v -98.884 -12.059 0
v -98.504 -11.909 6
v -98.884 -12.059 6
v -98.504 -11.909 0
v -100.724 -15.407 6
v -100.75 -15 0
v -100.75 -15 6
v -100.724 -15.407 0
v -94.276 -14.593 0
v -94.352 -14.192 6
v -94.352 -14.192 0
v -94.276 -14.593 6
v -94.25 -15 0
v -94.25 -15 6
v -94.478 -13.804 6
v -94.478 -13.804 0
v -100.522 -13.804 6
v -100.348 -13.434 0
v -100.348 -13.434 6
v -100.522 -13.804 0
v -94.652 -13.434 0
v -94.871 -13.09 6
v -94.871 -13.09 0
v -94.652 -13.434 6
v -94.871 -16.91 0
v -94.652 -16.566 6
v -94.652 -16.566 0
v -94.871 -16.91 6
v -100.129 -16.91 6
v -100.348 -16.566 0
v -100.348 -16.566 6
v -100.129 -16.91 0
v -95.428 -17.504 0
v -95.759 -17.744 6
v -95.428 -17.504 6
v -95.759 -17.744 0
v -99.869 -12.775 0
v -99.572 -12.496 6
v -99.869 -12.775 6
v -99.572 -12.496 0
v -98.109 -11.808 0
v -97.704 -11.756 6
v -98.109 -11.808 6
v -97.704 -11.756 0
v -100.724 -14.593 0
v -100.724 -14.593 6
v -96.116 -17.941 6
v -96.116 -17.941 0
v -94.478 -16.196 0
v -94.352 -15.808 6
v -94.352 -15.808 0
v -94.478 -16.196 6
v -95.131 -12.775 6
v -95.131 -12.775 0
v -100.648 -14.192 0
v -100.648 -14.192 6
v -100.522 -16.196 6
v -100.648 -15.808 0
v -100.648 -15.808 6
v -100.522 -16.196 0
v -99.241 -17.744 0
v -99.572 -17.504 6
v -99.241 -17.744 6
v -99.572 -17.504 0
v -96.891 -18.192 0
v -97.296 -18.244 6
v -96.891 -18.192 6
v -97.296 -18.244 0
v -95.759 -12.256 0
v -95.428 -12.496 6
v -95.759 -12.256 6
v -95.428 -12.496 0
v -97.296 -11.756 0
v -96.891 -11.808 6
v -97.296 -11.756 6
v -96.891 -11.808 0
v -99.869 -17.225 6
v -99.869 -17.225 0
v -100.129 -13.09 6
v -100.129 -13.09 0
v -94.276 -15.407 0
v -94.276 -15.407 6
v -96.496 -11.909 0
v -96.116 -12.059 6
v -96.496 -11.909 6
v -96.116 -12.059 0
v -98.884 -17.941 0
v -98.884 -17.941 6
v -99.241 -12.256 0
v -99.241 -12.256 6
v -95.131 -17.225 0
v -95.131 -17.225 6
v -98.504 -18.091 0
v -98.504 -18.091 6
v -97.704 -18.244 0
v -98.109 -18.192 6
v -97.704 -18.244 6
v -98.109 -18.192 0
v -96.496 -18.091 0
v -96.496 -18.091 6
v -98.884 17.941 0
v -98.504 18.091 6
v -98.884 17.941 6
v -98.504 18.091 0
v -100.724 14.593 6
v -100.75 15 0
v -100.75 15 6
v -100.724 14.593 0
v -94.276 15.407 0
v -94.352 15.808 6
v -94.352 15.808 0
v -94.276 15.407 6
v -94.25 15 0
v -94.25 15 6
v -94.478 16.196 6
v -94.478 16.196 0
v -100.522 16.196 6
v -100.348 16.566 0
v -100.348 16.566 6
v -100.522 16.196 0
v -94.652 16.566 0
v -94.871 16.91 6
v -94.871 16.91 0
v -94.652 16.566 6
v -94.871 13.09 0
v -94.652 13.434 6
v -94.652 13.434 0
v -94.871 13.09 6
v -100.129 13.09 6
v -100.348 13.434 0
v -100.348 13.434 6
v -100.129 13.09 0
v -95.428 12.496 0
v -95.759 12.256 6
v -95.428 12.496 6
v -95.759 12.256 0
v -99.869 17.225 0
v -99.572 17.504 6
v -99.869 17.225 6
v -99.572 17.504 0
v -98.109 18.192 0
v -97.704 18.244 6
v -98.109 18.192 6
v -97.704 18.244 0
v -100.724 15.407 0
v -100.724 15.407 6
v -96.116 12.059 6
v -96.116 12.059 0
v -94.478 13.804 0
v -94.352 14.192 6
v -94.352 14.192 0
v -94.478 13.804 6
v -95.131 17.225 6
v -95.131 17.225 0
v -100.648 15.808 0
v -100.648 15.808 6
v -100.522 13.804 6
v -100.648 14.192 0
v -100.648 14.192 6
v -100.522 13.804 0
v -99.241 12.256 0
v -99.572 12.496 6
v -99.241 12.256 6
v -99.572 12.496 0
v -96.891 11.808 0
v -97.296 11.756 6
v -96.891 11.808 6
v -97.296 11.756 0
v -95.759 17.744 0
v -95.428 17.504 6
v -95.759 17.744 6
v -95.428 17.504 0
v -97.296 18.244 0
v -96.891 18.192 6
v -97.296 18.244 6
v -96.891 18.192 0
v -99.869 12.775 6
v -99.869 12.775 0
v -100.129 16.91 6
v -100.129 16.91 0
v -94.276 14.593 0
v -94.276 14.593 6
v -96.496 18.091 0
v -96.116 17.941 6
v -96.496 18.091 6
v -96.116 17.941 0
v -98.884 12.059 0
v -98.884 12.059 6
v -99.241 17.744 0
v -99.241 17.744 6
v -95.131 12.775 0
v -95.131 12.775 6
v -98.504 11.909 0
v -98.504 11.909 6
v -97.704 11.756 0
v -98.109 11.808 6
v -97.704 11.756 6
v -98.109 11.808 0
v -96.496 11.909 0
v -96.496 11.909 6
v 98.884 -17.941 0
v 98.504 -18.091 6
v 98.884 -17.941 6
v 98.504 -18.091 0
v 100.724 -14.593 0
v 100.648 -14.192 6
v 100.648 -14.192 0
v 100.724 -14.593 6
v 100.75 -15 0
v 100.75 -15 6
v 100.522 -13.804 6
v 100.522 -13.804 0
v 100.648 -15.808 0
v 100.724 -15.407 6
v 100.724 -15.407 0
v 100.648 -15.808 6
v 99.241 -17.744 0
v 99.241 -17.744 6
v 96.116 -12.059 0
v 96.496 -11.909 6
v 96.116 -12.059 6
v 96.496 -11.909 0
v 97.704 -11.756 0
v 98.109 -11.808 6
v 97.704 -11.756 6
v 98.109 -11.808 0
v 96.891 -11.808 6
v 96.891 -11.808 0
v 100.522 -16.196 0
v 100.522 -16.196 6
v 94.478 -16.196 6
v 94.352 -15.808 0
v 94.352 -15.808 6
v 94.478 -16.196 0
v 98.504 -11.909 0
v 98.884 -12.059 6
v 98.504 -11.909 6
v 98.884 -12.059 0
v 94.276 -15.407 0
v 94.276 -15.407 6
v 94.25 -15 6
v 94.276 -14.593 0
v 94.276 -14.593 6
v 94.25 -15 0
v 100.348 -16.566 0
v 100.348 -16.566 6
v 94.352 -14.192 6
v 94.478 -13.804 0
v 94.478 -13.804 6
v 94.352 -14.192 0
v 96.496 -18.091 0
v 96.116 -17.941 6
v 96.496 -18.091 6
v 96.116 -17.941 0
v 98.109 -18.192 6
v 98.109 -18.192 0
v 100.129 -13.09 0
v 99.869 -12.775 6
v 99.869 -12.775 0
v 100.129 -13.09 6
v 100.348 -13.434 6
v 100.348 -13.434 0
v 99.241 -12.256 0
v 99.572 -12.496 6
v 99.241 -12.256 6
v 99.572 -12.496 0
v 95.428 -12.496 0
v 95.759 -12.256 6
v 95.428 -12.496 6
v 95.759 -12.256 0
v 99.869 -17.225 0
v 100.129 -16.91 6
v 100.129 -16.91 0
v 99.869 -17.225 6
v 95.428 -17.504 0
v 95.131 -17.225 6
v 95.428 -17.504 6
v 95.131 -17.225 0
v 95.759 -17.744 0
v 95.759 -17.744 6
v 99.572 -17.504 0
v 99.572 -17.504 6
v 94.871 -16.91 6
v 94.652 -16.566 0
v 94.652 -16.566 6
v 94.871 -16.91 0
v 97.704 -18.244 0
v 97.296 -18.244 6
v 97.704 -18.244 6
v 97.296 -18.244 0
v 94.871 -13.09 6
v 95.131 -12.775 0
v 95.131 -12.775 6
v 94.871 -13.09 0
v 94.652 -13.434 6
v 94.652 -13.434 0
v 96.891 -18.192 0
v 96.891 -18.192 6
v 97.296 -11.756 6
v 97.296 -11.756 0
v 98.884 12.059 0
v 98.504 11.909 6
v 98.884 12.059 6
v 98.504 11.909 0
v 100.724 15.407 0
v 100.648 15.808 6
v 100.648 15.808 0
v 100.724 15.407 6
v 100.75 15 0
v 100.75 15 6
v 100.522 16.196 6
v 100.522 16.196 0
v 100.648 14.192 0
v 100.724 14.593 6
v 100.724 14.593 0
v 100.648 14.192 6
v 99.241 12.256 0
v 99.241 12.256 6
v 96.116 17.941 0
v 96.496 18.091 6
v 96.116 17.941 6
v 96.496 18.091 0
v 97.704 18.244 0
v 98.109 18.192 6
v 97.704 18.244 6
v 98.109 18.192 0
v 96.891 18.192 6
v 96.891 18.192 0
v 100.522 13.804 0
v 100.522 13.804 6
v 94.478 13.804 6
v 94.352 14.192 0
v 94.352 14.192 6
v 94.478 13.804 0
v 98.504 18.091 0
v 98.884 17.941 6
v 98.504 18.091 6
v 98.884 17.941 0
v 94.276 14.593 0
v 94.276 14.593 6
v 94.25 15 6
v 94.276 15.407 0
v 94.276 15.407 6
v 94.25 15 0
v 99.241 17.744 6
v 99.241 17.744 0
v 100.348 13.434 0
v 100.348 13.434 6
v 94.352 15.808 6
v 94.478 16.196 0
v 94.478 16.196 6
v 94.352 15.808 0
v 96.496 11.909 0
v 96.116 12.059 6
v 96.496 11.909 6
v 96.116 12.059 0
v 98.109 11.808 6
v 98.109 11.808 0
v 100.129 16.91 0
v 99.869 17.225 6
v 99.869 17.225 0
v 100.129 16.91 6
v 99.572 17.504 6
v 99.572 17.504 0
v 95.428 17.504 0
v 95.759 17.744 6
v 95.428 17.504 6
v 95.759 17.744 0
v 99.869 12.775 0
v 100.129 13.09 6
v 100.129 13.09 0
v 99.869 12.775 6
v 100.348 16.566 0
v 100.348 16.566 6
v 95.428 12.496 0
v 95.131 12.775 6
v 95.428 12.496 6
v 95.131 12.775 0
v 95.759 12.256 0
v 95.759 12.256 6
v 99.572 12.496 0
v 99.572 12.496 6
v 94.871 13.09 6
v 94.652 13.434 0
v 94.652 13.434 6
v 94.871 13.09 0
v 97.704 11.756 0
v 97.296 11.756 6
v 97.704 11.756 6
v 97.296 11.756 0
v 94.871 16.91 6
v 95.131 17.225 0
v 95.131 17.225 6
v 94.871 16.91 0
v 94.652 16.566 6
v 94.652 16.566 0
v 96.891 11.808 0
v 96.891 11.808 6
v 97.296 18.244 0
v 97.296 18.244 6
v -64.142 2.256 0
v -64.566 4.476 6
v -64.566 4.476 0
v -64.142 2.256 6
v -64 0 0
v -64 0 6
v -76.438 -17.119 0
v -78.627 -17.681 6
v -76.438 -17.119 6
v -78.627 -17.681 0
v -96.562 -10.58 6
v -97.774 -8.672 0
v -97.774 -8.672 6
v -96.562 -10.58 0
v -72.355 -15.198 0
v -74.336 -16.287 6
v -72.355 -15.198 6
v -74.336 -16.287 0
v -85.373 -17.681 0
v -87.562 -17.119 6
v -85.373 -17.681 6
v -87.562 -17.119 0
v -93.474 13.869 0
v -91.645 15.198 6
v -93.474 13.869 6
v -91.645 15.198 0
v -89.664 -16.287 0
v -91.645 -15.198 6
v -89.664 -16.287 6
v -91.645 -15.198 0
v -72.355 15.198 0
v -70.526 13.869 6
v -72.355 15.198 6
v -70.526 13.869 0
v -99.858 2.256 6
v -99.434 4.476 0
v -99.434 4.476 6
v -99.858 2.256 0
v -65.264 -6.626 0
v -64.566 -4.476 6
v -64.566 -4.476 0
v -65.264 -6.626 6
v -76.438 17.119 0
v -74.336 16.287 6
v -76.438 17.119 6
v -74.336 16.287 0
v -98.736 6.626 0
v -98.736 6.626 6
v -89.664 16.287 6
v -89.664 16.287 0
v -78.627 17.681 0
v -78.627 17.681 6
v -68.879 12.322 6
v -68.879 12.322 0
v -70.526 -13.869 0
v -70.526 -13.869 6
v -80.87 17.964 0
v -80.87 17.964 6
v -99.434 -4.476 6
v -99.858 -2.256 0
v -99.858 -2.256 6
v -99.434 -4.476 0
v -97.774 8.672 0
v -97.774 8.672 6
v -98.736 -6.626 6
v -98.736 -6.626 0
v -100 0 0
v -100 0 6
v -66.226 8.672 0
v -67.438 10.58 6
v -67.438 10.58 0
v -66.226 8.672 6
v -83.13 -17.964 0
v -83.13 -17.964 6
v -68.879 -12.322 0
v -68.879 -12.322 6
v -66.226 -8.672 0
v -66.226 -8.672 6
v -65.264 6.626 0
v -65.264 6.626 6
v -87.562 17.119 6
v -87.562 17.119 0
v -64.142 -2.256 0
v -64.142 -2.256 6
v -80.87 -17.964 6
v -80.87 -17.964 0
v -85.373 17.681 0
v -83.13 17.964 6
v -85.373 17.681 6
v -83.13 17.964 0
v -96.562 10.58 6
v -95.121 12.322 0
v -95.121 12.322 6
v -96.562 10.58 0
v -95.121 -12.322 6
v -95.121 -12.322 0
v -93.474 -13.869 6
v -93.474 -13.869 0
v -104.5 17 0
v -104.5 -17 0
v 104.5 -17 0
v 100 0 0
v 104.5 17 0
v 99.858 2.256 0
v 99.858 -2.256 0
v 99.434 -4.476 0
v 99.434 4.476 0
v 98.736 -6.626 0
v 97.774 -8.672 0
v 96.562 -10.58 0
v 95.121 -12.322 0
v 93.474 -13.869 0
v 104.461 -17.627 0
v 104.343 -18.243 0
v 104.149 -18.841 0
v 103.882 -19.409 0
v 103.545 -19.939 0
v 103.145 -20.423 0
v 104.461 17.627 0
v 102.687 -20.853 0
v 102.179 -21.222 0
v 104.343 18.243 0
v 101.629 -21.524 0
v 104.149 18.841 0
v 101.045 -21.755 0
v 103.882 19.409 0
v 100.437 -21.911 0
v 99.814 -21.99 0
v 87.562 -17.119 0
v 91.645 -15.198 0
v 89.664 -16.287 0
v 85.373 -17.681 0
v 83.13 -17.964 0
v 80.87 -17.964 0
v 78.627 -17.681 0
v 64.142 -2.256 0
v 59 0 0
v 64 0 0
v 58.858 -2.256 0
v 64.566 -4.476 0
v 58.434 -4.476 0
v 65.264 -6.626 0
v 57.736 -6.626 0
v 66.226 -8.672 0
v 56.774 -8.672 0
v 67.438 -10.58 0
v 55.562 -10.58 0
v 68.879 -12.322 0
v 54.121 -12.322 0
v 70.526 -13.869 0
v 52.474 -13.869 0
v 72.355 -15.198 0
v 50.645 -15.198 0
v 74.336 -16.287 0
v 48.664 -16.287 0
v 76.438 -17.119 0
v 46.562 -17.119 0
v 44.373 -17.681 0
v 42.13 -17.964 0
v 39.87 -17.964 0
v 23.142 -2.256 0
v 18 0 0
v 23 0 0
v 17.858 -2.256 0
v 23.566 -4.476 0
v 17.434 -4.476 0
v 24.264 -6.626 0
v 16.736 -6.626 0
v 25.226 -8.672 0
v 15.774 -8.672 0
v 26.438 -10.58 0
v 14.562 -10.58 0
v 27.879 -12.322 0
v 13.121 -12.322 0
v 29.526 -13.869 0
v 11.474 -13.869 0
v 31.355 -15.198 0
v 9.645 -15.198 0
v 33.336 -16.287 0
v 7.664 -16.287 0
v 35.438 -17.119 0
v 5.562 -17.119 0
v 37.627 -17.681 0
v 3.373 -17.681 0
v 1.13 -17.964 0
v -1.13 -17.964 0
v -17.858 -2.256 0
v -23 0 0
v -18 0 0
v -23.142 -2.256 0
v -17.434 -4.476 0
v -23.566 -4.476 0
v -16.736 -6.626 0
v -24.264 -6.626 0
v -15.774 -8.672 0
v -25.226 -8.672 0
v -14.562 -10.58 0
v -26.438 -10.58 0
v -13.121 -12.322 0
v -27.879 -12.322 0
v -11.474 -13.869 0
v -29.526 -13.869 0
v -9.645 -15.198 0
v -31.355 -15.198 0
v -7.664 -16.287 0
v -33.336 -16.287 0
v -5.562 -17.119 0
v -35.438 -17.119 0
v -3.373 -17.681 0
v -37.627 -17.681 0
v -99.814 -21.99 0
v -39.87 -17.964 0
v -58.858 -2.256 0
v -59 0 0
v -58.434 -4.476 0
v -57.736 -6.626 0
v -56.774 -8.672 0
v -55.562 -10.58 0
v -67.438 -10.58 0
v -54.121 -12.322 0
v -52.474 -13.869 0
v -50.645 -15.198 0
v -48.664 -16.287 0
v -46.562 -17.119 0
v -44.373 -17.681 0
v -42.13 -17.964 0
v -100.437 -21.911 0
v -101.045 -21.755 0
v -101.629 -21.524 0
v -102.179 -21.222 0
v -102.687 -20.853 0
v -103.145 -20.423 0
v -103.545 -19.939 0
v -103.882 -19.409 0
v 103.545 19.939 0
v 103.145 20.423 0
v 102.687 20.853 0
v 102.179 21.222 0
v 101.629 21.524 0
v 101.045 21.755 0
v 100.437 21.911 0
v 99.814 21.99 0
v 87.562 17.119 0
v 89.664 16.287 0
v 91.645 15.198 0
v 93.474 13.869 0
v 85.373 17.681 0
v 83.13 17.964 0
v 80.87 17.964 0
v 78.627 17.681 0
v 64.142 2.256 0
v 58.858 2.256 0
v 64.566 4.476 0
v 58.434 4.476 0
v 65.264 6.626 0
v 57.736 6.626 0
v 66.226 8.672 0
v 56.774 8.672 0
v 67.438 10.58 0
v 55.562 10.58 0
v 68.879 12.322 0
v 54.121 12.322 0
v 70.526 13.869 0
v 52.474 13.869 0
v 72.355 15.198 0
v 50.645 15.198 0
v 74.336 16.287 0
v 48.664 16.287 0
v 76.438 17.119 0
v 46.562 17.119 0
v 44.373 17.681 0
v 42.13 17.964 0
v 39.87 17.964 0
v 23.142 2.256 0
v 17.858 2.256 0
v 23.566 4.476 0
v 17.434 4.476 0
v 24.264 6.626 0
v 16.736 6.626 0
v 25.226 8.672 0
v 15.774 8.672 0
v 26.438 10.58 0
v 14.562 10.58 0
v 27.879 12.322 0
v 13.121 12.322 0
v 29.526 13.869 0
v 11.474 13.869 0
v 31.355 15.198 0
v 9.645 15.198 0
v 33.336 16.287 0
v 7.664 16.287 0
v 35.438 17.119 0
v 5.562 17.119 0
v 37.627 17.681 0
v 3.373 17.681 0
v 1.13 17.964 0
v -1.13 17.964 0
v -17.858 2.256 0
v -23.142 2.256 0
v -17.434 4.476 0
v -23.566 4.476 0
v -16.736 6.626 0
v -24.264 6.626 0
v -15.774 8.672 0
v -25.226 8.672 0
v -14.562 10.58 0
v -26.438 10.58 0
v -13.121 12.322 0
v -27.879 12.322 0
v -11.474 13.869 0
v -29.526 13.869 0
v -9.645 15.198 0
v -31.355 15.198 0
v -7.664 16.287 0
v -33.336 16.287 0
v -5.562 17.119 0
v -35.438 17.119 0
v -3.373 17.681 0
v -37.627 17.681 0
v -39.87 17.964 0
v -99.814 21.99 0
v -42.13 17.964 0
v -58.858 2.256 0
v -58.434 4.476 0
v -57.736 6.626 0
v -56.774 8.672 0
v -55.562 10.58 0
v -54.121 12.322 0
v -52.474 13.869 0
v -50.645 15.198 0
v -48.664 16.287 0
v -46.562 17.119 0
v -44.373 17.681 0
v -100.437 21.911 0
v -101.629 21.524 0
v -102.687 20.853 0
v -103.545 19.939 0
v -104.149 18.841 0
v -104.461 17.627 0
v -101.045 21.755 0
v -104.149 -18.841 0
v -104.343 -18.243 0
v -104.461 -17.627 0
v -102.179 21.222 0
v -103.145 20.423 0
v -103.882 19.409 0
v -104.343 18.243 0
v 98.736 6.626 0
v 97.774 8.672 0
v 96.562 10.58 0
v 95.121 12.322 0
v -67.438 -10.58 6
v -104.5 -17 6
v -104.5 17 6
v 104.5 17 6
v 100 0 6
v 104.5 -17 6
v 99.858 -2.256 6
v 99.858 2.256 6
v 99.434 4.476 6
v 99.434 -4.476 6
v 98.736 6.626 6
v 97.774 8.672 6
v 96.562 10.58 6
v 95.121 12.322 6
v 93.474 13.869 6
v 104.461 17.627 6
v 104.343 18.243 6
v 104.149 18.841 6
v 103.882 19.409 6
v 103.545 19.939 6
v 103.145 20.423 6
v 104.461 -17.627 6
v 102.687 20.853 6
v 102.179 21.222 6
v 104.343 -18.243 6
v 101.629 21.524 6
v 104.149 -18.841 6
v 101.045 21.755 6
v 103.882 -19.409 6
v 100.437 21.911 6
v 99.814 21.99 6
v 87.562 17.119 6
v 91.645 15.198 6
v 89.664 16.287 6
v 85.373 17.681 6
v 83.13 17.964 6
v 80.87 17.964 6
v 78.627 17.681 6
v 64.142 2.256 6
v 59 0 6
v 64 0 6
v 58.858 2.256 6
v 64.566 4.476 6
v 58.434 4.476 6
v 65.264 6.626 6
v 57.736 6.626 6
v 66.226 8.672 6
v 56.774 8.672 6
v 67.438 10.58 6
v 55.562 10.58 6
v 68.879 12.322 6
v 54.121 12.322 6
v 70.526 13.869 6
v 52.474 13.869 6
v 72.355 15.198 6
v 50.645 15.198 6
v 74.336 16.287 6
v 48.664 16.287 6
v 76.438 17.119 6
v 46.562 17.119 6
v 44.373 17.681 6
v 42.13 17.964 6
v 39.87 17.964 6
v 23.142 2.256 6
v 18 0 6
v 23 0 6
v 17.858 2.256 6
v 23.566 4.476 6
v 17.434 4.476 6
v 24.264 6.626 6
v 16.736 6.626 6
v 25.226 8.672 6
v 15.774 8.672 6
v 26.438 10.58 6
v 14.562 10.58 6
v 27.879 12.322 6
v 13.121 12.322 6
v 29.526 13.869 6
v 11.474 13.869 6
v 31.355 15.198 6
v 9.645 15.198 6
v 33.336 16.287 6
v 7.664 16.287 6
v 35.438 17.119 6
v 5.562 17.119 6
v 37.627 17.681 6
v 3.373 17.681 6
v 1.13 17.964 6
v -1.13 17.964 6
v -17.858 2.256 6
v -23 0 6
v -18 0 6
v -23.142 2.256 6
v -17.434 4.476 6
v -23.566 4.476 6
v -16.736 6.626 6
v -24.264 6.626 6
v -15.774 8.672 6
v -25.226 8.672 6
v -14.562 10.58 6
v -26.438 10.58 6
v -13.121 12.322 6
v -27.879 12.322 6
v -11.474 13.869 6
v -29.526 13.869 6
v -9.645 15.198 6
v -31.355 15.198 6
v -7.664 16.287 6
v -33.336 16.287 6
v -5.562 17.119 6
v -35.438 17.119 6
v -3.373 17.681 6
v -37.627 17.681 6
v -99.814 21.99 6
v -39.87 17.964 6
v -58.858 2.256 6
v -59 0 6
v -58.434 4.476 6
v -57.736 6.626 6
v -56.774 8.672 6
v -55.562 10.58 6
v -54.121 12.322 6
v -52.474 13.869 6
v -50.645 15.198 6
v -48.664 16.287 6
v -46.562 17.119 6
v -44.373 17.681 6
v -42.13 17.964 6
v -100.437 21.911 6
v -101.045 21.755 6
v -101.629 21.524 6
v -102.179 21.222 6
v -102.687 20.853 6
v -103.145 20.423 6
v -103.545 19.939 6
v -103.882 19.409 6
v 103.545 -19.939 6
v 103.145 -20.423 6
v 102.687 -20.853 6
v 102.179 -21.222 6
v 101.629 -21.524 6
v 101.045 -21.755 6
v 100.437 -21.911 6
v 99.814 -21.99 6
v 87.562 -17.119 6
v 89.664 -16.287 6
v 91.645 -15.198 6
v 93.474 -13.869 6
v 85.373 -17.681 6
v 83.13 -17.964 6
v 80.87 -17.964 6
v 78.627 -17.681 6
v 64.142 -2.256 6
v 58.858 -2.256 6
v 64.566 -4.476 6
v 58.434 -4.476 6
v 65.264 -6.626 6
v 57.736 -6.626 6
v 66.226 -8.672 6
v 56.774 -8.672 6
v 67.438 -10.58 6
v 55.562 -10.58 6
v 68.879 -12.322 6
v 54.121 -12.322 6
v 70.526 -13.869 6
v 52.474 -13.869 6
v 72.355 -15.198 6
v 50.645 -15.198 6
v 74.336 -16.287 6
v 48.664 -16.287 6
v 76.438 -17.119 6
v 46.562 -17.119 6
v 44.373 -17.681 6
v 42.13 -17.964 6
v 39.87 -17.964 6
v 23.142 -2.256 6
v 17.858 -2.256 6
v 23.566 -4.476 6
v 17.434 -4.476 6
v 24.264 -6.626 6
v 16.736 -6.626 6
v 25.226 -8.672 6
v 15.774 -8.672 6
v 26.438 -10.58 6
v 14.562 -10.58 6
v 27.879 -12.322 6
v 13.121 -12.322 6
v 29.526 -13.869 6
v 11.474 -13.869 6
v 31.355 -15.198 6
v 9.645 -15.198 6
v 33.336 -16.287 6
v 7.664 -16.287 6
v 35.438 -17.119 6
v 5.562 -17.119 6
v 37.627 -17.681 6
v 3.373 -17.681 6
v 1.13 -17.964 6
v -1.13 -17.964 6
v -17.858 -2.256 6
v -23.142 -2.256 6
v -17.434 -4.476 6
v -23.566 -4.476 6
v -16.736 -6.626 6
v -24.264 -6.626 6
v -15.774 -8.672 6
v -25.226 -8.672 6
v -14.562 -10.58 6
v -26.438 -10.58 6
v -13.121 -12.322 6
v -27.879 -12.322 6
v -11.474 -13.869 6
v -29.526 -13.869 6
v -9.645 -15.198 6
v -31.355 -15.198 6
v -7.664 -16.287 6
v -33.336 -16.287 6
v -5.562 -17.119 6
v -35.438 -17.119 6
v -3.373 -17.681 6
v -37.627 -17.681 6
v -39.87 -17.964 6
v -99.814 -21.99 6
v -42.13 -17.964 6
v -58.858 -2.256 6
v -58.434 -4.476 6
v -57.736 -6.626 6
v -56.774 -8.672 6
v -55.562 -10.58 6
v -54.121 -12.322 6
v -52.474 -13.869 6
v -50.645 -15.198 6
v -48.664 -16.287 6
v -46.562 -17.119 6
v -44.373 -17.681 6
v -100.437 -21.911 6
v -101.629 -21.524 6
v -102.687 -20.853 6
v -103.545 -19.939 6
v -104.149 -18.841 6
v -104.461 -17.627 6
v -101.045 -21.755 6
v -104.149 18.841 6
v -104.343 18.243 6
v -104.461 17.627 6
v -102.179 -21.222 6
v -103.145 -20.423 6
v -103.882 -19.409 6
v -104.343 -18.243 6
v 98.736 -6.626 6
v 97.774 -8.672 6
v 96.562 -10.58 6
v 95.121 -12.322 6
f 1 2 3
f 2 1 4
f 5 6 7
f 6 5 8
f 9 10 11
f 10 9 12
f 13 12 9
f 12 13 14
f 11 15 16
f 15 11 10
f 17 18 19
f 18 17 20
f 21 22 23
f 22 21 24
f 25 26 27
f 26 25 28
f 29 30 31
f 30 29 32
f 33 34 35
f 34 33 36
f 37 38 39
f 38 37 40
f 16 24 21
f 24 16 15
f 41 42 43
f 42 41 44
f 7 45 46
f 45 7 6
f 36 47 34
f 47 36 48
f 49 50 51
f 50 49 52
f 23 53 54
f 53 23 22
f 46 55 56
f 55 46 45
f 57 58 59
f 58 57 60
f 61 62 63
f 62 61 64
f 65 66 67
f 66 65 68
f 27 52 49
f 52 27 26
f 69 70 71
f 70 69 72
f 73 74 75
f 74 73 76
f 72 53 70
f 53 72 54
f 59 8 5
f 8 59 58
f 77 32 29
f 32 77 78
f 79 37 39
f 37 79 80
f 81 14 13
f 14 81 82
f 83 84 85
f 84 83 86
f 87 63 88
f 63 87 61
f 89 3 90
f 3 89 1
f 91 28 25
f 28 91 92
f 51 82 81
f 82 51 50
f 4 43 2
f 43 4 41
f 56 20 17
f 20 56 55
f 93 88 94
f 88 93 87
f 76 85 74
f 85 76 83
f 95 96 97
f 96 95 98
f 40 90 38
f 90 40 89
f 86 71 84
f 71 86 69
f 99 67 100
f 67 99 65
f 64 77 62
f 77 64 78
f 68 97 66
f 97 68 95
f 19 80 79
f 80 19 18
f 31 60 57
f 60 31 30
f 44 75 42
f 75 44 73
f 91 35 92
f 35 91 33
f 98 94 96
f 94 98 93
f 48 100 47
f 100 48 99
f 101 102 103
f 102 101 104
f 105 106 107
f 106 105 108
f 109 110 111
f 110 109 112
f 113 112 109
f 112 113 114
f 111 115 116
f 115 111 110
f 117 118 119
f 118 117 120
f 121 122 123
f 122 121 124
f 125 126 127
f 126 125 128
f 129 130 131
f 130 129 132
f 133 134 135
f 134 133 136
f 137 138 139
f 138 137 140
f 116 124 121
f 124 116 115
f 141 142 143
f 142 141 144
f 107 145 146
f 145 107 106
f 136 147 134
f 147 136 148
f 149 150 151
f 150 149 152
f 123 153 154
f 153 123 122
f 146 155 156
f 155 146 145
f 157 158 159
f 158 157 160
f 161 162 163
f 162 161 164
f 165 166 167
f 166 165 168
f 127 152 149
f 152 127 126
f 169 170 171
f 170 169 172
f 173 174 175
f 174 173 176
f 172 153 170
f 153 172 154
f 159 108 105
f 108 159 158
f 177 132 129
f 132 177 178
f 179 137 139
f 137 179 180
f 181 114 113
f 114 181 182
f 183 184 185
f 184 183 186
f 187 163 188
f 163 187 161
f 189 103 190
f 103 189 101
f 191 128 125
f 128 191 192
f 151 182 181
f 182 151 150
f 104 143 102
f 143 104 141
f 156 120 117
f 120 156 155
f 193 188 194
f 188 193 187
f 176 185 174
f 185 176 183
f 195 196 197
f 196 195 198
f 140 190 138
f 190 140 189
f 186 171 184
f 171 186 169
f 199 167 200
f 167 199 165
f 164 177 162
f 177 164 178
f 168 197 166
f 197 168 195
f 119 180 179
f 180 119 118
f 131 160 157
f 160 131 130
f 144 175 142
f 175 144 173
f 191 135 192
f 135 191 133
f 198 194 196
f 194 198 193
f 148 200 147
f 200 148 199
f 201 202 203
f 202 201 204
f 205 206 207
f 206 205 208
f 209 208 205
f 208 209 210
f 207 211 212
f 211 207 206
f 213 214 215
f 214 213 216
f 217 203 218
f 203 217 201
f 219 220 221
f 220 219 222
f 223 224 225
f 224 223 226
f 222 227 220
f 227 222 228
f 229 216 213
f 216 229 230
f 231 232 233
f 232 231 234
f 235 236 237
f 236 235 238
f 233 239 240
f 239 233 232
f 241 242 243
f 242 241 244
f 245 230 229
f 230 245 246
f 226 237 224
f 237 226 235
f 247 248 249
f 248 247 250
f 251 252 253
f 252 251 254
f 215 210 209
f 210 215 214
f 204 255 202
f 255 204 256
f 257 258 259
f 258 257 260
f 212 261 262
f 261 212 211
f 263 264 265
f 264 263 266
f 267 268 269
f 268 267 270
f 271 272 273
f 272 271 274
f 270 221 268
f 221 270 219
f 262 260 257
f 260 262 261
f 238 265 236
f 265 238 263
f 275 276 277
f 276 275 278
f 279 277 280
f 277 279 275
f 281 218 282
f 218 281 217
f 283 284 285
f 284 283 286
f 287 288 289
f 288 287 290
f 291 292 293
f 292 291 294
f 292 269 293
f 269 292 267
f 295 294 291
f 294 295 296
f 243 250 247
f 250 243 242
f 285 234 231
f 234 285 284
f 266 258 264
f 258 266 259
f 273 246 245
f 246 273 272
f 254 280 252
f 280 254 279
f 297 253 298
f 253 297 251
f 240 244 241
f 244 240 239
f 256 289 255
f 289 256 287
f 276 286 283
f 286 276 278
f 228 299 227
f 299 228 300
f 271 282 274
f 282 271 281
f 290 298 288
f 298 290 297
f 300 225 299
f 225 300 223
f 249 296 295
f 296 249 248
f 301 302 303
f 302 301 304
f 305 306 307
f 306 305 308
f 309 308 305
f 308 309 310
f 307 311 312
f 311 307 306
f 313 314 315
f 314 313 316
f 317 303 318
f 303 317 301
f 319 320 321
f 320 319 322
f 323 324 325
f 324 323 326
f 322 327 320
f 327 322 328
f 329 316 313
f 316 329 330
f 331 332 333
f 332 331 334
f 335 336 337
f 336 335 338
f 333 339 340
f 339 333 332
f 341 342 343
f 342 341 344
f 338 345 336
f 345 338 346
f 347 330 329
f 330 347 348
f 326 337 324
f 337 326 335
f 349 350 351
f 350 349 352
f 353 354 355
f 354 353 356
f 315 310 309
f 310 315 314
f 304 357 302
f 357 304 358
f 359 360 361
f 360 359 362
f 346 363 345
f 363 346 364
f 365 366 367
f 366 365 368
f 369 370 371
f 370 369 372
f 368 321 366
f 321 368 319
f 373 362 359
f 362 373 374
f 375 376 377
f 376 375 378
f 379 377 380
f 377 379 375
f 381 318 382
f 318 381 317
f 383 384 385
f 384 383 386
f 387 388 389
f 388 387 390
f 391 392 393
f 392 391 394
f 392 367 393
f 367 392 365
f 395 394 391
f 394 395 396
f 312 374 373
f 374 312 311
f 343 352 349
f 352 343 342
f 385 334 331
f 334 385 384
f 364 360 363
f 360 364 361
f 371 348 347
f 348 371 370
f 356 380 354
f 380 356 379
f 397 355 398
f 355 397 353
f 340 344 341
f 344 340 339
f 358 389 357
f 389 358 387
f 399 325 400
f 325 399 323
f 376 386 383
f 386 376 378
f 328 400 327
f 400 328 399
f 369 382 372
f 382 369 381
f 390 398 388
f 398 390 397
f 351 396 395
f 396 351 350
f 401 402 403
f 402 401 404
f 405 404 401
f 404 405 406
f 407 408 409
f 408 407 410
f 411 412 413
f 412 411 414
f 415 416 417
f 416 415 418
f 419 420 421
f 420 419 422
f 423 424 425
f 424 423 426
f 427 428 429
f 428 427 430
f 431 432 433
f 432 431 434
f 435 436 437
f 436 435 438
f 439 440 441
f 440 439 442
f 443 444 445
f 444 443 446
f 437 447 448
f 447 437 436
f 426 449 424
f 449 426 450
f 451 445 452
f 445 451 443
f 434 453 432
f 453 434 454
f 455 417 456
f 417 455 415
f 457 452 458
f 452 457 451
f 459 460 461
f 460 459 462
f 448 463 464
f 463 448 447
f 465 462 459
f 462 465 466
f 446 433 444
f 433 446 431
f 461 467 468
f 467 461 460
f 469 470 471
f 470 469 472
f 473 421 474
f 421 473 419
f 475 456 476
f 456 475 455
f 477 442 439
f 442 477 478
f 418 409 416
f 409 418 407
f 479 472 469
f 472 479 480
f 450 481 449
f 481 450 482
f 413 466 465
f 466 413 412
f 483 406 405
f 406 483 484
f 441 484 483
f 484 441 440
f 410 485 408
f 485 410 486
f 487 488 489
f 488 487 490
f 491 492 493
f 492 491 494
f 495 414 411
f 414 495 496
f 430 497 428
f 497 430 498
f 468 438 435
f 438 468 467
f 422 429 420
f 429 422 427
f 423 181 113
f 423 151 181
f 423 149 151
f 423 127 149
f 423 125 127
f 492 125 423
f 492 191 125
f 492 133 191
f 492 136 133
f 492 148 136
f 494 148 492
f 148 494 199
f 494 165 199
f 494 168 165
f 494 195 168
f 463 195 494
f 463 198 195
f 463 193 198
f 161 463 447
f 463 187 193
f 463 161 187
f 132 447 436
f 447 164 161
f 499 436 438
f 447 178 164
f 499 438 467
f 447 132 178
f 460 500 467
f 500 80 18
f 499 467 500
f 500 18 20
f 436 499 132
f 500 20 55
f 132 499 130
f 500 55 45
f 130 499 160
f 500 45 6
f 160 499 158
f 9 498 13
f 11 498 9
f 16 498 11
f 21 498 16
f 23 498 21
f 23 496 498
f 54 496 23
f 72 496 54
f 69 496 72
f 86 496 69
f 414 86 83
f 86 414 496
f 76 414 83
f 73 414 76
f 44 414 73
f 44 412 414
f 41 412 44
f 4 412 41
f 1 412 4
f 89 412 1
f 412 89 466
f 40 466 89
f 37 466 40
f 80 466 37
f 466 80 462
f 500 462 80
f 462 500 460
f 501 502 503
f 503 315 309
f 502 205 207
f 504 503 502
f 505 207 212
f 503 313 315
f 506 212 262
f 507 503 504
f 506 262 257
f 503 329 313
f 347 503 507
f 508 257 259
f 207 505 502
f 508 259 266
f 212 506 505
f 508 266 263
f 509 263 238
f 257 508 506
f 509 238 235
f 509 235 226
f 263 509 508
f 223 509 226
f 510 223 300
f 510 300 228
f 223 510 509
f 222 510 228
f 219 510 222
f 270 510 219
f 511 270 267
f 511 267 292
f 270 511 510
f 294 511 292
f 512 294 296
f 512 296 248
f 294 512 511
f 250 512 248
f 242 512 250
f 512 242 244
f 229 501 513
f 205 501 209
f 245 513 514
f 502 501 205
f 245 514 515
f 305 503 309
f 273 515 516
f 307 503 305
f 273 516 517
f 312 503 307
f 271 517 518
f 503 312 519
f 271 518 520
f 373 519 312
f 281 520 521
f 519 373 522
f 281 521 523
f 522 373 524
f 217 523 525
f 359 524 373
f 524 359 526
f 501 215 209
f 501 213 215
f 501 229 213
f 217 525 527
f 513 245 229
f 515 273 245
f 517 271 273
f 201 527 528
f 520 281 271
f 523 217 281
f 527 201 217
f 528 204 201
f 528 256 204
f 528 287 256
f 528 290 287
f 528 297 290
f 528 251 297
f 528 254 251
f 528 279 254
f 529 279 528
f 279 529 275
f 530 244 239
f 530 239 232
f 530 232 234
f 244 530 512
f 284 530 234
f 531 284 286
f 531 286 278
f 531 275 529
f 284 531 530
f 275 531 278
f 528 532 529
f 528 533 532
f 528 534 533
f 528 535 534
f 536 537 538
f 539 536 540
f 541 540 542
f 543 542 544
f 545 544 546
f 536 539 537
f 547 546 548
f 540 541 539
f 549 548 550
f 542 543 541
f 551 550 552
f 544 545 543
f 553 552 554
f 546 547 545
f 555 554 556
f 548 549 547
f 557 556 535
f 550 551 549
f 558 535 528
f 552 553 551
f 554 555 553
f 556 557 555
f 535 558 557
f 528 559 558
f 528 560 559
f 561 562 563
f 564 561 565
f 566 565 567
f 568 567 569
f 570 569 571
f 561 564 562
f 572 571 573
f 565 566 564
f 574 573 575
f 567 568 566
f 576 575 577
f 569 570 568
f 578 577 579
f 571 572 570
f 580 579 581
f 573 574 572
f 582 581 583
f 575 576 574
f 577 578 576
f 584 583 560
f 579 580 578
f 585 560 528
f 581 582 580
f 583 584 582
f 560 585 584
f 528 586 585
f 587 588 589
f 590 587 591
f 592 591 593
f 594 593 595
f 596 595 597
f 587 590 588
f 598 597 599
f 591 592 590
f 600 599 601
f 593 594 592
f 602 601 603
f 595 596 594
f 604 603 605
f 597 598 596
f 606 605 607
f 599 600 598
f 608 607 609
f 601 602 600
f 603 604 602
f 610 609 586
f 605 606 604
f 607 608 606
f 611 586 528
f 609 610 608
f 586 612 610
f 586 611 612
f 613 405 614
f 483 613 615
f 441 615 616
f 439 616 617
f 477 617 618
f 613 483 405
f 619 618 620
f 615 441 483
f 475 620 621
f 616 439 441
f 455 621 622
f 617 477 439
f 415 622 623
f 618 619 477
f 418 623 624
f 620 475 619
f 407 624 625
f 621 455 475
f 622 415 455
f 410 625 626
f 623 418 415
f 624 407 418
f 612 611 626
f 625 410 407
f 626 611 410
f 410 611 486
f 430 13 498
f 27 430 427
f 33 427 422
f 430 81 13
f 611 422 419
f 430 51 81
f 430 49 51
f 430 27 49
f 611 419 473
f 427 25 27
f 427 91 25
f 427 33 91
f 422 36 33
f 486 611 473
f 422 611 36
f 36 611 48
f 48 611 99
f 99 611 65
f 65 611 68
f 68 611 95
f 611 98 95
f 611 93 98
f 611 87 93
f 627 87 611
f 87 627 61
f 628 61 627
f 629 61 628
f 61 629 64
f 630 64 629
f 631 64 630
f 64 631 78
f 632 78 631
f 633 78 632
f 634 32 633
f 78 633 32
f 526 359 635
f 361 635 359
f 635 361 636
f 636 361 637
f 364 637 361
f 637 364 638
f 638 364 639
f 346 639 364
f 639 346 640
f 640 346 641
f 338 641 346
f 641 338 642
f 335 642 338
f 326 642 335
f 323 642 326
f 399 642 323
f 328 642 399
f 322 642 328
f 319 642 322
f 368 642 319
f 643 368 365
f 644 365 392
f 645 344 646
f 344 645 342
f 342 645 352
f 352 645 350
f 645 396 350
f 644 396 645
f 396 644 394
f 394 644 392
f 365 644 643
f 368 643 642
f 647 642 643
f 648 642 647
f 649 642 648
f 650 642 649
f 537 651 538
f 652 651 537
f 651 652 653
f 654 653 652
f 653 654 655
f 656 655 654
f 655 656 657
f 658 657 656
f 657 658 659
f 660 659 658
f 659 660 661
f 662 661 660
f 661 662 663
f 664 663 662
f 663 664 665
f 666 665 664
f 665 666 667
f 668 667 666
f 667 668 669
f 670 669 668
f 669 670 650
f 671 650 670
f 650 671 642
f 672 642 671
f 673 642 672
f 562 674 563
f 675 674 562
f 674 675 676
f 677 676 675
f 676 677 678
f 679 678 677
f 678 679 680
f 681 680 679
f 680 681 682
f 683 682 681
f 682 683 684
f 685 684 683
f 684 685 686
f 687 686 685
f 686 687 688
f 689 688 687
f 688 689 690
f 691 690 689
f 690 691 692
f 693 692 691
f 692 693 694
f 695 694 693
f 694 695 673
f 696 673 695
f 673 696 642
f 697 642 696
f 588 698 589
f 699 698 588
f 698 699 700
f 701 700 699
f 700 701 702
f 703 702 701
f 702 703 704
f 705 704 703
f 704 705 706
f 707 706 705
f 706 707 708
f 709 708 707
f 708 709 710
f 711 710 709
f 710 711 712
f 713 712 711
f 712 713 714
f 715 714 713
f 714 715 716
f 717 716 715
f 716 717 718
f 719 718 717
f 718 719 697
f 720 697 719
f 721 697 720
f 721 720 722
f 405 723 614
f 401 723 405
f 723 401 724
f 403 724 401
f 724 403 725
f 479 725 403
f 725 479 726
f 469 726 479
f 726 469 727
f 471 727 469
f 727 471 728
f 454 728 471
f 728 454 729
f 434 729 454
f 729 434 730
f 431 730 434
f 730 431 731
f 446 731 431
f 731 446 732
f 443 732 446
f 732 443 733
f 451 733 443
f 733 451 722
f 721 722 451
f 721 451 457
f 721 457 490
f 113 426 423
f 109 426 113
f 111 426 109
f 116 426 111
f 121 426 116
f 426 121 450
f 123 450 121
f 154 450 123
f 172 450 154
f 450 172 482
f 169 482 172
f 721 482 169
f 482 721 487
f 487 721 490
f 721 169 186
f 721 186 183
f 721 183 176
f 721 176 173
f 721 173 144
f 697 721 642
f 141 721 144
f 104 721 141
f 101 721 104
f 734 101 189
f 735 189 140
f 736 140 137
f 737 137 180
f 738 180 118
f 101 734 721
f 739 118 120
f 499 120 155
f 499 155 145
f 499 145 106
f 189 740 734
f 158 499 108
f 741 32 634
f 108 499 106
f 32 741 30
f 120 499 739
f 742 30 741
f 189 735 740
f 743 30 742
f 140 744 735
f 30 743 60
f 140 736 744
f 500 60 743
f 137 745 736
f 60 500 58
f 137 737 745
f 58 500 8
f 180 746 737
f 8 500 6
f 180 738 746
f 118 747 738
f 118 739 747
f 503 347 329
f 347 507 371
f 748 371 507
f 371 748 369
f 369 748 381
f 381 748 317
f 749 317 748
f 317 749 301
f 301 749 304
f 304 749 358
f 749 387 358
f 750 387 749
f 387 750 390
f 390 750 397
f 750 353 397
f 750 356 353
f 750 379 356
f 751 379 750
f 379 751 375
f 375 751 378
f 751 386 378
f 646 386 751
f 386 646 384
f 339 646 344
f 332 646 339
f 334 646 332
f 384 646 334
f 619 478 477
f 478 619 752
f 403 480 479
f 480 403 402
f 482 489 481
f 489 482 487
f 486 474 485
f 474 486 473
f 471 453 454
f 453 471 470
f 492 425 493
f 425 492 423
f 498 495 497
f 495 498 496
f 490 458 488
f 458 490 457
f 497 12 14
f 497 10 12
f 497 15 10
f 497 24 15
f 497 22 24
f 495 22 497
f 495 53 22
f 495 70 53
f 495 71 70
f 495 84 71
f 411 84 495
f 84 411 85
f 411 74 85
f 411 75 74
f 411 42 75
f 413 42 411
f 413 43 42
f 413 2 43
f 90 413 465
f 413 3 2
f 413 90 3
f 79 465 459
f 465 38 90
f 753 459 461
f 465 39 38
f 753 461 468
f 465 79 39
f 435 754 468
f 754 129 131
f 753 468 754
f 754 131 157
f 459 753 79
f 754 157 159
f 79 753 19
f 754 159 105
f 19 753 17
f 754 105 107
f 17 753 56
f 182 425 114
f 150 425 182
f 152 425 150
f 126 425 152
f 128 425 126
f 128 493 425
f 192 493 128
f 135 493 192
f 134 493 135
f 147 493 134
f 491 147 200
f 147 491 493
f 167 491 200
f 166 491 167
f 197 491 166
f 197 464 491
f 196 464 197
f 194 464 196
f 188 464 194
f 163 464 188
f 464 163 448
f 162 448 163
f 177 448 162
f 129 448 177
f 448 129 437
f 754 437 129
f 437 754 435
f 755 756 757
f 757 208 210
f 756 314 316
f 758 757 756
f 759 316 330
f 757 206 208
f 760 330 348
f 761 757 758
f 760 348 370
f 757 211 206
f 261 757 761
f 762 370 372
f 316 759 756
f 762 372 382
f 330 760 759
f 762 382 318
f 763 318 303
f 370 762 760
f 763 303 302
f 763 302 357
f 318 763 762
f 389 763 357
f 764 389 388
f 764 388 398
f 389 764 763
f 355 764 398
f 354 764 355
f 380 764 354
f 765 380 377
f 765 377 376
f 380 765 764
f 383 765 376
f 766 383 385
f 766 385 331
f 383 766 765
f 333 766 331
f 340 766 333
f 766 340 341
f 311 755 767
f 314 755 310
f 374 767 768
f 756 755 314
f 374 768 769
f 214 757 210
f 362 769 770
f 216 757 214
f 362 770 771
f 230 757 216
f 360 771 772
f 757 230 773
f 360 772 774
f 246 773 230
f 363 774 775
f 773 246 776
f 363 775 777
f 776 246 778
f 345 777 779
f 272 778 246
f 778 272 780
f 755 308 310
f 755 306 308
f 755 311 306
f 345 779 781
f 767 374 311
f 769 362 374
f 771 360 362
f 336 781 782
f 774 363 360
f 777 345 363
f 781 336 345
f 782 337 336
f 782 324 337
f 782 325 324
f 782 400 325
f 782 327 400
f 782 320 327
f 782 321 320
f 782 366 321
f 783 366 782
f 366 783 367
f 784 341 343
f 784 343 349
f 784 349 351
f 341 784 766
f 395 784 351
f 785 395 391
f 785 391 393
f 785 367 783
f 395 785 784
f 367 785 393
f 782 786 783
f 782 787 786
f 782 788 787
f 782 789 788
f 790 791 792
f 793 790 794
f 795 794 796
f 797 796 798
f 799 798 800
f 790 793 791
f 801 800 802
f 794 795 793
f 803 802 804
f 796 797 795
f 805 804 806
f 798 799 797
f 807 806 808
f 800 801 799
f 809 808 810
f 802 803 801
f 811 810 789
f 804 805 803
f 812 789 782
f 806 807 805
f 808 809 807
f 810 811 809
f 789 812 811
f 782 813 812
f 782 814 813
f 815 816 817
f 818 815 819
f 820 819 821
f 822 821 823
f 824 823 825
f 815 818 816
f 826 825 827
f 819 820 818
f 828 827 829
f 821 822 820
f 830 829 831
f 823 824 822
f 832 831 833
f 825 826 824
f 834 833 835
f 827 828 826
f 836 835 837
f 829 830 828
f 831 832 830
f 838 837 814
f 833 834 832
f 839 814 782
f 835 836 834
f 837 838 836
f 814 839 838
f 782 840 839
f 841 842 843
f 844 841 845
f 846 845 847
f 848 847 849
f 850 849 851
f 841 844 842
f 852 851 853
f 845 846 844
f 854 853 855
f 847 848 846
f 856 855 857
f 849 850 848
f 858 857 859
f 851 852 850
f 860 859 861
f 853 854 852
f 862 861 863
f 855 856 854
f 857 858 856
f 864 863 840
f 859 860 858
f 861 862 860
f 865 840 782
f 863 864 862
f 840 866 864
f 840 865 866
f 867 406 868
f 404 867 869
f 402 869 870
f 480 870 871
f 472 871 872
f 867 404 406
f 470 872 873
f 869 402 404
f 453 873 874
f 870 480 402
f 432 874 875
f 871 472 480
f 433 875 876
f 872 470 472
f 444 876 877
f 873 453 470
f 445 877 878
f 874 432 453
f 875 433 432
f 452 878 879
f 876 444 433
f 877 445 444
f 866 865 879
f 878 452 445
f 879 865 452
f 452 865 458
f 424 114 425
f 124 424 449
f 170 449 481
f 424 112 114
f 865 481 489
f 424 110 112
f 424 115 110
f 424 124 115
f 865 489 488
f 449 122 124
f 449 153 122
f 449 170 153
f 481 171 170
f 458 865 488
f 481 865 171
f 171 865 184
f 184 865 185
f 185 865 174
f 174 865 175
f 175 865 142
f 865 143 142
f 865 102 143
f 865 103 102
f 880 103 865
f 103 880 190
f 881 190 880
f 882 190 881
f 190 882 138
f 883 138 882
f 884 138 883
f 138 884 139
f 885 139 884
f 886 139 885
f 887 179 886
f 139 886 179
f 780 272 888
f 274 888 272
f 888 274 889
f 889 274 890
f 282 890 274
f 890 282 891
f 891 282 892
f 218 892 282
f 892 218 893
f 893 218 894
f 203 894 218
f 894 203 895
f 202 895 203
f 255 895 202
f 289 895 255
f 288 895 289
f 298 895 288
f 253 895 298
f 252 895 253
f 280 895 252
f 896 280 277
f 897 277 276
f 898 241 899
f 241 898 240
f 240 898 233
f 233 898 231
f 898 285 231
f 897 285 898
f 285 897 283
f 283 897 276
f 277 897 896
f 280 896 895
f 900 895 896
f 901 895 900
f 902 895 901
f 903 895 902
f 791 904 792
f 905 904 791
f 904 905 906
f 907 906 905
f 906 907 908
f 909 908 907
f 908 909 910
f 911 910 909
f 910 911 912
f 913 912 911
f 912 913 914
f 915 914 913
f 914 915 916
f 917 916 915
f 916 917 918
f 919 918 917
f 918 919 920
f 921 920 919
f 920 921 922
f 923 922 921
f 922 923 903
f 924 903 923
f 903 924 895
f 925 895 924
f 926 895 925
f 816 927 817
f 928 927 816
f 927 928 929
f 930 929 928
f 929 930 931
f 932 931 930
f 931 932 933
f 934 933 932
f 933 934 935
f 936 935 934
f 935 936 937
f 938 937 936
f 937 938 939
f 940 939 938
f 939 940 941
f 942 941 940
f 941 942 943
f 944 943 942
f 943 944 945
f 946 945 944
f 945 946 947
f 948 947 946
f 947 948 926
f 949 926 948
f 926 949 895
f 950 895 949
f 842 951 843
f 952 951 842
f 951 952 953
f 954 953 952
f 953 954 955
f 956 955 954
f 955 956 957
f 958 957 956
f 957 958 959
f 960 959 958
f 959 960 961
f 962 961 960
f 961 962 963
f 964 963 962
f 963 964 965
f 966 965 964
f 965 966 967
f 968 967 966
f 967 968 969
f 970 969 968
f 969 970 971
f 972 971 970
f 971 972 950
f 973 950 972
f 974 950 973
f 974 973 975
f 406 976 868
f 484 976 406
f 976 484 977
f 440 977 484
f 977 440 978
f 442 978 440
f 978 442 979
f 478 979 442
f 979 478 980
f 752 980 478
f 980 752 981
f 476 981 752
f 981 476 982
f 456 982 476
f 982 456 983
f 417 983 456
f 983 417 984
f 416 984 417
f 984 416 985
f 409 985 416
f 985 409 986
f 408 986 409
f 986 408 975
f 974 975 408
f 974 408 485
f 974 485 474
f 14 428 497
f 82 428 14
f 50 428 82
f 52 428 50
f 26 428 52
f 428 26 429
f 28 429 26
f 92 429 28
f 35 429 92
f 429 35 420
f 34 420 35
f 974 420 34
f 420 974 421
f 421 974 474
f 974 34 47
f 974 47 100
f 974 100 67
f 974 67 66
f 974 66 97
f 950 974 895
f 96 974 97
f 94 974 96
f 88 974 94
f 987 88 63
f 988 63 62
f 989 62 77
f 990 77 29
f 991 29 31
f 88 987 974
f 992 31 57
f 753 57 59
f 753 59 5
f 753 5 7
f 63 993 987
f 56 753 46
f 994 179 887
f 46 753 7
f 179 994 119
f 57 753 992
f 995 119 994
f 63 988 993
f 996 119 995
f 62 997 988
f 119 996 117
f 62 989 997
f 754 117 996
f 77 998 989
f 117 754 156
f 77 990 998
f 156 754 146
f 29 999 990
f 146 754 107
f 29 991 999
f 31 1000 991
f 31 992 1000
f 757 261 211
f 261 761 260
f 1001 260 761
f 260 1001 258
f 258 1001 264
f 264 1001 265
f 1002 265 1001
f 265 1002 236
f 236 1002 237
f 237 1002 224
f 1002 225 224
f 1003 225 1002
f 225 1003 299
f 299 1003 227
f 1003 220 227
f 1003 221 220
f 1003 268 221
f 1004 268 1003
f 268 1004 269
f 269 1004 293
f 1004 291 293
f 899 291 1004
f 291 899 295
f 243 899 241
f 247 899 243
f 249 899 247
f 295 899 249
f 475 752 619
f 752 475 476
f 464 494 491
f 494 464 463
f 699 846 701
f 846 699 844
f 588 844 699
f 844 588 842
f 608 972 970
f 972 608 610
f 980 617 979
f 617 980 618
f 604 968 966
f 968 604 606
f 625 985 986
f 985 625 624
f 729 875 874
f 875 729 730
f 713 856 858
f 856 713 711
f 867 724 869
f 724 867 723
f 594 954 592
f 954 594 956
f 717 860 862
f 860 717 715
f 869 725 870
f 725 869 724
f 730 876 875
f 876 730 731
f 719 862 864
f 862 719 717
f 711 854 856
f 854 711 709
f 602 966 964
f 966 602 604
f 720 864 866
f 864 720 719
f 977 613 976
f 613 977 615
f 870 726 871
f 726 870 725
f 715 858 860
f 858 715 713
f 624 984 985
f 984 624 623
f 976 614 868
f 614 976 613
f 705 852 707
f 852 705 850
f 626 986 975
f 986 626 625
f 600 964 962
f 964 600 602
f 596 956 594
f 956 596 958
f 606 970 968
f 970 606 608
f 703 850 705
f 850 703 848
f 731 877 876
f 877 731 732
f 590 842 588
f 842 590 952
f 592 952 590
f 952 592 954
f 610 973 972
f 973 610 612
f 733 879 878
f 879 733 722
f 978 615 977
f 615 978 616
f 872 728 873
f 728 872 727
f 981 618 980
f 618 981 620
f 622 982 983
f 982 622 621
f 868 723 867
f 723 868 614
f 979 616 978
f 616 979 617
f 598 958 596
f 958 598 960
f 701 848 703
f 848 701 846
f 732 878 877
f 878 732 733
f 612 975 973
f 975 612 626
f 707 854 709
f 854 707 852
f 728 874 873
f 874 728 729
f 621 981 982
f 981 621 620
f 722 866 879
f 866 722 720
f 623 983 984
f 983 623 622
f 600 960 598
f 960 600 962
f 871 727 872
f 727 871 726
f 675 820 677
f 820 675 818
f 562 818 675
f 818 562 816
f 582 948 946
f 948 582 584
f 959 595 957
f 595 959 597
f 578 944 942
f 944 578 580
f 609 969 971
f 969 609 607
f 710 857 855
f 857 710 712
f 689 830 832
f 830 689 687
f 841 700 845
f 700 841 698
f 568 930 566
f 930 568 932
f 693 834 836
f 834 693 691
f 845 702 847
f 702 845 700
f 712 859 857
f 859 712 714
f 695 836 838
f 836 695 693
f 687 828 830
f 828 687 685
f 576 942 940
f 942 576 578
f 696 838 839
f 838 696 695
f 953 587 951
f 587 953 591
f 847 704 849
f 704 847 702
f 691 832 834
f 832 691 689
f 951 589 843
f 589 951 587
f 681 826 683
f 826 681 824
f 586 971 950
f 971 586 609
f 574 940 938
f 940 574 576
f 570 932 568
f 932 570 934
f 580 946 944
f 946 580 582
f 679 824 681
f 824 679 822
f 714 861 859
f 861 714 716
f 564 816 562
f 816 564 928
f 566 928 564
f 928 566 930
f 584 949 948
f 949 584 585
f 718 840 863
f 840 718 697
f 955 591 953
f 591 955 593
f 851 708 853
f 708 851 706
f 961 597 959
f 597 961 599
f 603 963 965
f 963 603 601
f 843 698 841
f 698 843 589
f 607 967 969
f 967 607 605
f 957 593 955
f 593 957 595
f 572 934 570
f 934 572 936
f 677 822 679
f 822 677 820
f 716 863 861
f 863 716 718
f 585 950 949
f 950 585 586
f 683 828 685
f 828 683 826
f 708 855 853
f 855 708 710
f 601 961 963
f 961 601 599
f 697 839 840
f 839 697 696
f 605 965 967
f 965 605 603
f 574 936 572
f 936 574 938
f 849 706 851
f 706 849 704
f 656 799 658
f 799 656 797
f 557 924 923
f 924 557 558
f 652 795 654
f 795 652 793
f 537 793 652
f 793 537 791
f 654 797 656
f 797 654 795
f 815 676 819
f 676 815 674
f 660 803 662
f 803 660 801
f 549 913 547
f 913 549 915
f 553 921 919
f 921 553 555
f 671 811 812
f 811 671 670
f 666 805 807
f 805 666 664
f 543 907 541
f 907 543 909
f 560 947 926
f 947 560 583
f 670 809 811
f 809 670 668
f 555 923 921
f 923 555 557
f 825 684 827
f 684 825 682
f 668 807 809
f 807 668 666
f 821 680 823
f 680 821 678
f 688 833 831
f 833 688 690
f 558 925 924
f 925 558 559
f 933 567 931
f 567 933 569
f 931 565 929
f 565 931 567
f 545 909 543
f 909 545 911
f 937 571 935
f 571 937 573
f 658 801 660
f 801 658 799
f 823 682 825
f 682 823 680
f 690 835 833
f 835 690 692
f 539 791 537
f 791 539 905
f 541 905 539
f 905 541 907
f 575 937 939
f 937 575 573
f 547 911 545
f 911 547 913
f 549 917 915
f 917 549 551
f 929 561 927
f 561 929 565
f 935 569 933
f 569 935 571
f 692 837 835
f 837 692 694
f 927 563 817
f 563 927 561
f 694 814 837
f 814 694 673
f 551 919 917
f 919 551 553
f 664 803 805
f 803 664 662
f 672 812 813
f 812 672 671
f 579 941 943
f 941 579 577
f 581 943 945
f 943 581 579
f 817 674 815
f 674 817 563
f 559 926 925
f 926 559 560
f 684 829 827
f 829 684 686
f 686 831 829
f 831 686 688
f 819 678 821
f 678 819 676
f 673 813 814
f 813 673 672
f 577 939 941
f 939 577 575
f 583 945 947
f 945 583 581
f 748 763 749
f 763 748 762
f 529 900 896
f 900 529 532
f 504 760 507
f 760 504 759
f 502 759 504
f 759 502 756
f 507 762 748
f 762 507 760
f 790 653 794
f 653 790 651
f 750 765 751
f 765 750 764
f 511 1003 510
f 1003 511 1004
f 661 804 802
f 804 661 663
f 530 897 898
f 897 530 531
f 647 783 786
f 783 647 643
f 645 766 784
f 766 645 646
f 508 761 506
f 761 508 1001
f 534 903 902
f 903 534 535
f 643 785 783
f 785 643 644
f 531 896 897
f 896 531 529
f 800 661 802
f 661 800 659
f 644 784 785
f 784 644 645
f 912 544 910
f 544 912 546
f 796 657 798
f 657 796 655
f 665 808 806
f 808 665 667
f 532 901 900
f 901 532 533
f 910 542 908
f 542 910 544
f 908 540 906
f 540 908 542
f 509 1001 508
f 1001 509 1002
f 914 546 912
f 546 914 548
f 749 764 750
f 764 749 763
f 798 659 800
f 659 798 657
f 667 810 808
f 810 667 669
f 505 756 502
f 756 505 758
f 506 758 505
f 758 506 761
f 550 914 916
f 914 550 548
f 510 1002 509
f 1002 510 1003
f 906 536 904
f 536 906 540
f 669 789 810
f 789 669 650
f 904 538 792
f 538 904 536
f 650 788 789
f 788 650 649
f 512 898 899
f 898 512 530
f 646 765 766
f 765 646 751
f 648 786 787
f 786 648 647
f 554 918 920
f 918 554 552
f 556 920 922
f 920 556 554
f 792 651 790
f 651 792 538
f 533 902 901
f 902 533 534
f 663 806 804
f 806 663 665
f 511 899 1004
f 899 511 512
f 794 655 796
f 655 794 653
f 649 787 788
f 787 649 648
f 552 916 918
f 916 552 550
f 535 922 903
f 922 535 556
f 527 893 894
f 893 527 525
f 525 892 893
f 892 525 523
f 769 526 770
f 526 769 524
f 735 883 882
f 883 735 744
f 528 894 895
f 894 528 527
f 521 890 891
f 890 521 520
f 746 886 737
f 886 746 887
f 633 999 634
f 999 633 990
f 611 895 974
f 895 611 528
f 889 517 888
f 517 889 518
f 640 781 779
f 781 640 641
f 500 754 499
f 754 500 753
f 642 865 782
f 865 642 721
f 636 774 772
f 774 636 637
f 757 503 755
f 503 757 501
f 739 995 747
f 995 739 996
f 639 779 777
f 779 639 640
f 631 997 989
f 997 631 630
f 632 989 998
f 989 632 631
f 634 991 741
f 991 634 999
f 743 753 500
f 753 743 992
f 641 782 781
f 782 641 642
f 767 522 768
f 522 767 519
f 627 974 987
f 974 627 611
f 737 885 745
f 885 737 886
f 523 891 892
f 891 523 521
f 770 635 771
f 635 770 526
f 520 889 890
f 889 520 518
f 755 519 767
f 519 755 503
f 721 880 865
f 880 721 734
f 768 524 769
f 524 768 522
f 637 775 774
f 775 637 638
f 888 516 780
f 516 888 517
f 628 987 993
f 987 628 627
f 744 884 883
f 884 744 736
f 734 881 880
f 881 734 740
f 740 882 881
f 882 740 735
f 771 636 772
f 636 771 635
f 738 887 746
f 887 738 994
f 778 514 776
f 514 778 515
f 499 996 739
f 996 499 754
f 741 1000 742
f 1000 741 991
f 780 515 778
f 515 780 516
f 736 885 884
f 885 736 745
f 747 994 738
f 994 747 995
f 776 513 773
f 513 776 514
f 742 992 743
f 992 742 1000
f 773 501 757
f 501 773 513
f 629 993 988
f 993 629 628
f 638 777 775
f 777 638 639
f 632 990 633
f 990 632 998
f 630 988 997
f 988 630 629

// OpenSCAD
$fn = 50;

difference() {
	union() {
		hull() {
			translate(v = [-99.5, 17.0, 0]) {
				cylinder(h = 6, r = 5);
			}
			translate(v = [99.5, 17.0, 0]) {
				cylinder(h = 6, r = 5);
			}
			translate(v = [-99.5, -17.0, 0]) {
				cylinder(h = 6, r = 5);
			}
			translate(v = [99.5, -17.0, 0]) {
				cylinder(h = 6, r = 5);
			}
		}
	}
	union() {
		translate(v = [-97.5, -15.0, -100.0]) {
			cylinder(h = 200, r = 3.25);
		}
		translate(v = [-97.5, 15.0, -100.0]) {
			cylinder(h = 200, r = 3.25);
		}
		translate(v = [97.5, -15.0, -100.0]) {
			cylinder(h = 200, r = 3.25);
		}
		translate(v = [97.5, 15.0, -100.0]) {
			cylinder(h = 200, r = 3.25);
		}
		translate(v = [-97.5, -15.0, -100.0]) {
			cylinder(h = 200, r = 1.8);
		}
		translate(v = [-97.5, 15.0, -100.0]) {
			cylinder(h = 200, r = 1.8);
		}
		translate(v = [97.5, -15.0, -100.0]) {
			cylinder(h = 200, r = 1.8);
		}
		translate(v = [97.5, 15.0, -100.0]) {
			cylinder(h = 200, r = 1.8);
		}
		translate(v = [-82.0, 0, 0.0]) {
			cylinder(h = 6, r = 18.0);
		}
		translate(v = [-41.0, 0, 0.0]) {
			cylinder(h = 6, r = 18.0);
		}
		cylinder(h = 6, r = 18.0);
		translate(v = [41.0, 0, 0.0]) {
			cylinder(h = 6, r = 18.0);
		}
		translate(v = [82.0, 0, 0.0]) {
			cylinder(h = 6, r = 18.0);
		}
	}
}
